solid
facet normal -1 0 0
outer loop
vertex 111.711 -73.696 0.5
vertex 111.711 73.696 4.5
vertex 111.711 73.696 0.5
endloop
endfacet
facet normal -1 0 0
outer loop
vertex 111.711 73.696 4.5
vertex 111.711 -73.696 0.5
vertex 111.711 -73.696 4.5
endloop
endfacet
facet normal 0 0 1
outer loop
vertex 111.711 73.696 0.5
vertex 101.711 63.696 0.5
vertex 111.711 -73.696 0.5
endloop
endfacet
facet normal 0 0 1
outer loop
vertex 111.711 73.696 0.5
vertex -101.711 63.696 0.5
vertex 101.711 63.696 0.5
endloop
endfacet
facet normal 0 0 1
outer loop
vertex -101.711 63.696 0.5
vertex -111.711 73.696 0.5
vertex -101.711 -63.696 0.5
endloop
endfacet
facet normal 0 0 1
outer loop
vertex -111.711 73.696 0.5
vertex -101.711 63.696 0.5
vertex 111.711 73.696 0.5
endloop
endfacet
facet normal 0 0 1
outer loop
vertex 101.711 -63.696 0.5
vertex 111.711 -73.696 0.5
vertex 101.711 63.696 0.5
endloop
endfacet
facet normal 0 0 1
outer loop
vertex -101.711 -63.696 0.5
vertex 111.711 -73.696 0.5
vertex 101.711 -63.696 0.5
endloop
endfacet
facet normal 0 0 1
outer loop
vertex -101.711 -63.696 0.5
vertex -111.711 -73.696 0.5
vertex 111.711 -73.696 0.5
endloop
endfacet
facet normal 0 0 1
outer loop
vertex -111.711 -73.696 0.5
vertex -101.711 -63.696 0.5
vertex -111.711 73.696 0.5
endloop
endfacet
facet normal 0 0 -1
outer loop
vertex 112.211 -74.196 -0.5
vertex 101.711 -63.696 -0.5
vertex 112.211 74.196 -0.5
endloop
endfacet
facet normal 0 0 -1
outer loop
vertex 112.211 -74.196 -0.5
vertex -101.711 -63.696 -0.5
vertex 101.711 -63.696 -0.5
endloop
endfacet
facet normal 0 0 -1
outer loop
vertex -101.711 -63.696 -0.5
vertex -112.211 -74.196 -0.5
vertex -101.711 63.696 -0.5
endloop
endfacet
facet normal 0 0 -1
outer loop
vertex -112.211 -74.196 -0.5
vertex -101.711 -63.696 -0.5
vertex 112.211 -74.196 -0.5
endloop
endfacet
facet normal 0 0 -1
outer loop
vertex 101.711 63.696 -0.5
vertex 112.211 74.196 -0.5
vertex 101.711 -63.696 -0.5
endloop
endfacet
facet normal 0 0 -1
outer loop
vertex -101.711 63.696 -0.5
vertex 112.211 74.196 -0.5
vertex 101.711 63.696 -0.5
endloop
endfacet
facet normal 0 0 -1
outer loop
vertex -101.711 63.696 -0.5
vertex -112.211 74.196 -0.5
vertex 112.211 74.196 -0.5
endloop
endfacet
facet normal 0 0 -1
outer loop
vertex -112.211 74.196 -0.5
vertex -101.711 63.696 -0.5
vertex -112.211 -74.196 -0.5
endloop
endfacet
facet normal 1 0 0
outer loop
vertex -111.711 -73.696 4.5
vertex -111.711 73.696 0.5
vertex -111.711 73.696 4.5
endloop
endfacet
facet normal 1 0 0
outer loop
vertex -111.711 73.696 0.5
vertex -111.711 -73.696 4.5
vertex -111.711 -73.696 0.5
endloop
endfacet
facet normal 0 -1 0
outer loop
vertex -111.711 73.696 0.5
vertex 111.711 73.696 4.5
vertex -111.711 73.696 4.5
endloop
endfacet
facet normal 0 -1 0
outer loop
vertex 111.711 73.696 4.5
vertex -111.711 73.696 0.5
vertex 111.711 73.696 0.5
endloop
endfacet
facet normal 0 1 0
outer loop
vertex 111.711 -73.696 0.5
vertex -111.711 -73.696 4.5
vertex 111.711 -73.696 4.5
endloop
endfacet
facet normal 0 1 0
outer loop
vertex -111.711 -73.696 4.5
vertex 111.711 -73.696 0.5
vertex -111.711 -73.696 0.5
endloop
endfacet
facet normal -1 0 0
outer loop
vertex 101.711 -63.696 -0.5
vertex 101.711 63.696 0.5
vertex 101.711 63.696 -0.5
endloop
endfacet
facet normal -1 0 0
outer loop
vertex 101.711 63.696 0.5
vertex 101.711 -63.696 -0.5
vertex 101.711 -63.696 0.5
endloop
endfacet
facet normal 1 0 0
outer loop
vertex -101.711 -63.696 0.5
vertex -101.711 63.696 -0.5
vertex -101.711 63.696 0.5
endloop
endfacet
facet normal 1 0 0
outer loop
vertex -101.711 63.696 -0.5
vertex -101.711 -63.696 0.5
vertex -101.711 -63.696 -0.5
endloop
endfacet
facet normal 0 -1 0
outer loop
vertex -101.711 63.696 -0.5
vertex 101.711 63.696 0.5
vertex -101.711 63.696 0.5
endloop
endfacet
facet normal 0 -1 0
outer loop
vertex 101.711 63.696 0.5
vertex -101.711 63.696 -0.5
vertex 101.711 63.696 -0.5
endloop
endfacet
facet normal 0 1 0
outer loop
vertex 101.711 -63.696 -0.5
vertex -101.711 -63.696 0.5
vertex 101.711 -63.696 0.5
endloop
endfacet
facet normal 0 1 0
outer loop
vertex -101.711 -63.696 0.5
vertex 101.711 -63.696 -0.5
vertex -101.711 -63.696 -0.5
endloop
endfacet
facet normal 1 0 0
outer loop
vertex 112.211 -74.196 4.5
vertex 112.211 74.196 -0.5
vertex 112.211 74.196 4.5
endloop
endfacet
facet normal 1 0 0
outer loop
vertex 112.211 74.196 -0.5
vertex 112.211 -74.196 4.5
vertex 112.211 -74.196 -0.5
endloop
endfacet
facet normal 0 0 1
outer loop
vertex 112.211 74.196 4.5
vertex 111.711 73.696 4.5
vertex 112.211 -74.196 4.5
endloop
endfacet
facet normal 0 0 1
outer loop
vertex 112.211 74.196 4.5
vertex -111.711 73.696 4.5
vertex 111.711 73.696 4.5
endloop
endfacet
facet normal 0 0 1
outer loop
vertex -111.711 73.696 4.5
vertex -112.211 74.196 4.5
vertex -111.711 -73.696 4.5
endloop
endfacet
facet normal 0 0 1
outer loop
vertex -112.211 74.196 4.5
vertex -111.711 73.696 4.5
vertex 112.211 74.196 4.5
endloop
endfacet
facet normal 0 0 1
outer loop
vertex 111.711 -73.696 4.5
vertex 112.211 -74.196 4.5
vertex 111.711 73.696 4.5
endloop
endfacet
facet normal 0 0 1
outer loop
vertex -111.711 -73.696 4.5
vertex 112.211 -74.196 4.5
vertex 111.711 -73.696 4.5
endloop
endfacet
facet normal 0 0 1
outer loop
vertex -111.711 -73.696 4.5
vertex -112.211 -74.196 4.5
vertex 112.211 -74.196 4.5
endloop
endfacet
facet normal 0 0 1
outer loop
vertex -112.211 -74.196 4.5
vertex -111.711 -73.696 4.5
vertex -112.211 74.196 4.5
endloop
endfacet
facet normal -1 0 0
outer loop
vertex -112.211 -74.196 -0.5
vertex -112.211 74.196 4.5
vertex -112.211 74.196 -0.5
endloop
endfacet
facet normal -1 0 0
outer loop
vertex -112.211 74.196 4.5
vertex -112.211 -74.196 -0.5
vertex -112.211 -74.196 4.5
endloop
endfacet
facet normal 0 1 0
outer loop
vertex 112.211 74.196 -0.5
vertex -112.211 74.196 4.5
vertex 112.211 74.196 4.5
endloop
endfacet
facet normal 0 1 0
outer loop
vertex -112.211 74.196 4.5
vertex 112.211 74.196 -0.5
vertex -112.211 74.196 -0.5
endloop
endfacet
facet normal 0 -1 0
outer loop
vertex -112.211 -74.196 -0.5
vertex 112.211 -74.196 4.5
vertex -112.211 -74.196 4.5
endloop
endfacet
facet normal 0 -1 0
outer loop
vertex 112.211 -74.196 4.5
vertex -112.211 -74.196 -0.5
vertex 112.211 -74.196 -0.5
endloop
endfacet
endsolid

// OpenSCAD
// file: ../pills/dimensions.scad
function plate_width() = 193.422;
function plate_height() = 117.392;
function plate_thickness() = 3;
function separation() = 5;
function led_width() = 10;
function led_height() = 2.5;
function hole_radius() = 1.5;
function hole_offset() = 3.5 + hole_radius();
function separator_thickness() = (led_width()-plate_thickness())/2;

function electronics_width() = 81.3;
function electronics_height() = 50.7;
function electronics_thickness() = 23;
// main file
use <../pills/dimensions.scad>

thickness = 4;
fix_thickness = 1;
fix_height = 5;
inset = 10;
width = plate_width() + led_height() * 2 + thickness*6 + fix_thickness;
height = plate_height() + led_height() * 2 + thickness*6 + fix_thickness;
module edge_fix() {
    translate([0, 0, 0])
    difference() {
        cube([width, height, fix_thickness], center=true);
        cube([width - inset*2, height - inset*2, thickness*3], center=true);
    }
    translate([0, 0, (fix_height - fix_thickness)/2])
    difference() {
        cube([width + fix_thickness, height + fix_thickness, fix_height], center=true);
        cube([width, height, fix_height*2], center=true);
    }
}

edge_fix();
